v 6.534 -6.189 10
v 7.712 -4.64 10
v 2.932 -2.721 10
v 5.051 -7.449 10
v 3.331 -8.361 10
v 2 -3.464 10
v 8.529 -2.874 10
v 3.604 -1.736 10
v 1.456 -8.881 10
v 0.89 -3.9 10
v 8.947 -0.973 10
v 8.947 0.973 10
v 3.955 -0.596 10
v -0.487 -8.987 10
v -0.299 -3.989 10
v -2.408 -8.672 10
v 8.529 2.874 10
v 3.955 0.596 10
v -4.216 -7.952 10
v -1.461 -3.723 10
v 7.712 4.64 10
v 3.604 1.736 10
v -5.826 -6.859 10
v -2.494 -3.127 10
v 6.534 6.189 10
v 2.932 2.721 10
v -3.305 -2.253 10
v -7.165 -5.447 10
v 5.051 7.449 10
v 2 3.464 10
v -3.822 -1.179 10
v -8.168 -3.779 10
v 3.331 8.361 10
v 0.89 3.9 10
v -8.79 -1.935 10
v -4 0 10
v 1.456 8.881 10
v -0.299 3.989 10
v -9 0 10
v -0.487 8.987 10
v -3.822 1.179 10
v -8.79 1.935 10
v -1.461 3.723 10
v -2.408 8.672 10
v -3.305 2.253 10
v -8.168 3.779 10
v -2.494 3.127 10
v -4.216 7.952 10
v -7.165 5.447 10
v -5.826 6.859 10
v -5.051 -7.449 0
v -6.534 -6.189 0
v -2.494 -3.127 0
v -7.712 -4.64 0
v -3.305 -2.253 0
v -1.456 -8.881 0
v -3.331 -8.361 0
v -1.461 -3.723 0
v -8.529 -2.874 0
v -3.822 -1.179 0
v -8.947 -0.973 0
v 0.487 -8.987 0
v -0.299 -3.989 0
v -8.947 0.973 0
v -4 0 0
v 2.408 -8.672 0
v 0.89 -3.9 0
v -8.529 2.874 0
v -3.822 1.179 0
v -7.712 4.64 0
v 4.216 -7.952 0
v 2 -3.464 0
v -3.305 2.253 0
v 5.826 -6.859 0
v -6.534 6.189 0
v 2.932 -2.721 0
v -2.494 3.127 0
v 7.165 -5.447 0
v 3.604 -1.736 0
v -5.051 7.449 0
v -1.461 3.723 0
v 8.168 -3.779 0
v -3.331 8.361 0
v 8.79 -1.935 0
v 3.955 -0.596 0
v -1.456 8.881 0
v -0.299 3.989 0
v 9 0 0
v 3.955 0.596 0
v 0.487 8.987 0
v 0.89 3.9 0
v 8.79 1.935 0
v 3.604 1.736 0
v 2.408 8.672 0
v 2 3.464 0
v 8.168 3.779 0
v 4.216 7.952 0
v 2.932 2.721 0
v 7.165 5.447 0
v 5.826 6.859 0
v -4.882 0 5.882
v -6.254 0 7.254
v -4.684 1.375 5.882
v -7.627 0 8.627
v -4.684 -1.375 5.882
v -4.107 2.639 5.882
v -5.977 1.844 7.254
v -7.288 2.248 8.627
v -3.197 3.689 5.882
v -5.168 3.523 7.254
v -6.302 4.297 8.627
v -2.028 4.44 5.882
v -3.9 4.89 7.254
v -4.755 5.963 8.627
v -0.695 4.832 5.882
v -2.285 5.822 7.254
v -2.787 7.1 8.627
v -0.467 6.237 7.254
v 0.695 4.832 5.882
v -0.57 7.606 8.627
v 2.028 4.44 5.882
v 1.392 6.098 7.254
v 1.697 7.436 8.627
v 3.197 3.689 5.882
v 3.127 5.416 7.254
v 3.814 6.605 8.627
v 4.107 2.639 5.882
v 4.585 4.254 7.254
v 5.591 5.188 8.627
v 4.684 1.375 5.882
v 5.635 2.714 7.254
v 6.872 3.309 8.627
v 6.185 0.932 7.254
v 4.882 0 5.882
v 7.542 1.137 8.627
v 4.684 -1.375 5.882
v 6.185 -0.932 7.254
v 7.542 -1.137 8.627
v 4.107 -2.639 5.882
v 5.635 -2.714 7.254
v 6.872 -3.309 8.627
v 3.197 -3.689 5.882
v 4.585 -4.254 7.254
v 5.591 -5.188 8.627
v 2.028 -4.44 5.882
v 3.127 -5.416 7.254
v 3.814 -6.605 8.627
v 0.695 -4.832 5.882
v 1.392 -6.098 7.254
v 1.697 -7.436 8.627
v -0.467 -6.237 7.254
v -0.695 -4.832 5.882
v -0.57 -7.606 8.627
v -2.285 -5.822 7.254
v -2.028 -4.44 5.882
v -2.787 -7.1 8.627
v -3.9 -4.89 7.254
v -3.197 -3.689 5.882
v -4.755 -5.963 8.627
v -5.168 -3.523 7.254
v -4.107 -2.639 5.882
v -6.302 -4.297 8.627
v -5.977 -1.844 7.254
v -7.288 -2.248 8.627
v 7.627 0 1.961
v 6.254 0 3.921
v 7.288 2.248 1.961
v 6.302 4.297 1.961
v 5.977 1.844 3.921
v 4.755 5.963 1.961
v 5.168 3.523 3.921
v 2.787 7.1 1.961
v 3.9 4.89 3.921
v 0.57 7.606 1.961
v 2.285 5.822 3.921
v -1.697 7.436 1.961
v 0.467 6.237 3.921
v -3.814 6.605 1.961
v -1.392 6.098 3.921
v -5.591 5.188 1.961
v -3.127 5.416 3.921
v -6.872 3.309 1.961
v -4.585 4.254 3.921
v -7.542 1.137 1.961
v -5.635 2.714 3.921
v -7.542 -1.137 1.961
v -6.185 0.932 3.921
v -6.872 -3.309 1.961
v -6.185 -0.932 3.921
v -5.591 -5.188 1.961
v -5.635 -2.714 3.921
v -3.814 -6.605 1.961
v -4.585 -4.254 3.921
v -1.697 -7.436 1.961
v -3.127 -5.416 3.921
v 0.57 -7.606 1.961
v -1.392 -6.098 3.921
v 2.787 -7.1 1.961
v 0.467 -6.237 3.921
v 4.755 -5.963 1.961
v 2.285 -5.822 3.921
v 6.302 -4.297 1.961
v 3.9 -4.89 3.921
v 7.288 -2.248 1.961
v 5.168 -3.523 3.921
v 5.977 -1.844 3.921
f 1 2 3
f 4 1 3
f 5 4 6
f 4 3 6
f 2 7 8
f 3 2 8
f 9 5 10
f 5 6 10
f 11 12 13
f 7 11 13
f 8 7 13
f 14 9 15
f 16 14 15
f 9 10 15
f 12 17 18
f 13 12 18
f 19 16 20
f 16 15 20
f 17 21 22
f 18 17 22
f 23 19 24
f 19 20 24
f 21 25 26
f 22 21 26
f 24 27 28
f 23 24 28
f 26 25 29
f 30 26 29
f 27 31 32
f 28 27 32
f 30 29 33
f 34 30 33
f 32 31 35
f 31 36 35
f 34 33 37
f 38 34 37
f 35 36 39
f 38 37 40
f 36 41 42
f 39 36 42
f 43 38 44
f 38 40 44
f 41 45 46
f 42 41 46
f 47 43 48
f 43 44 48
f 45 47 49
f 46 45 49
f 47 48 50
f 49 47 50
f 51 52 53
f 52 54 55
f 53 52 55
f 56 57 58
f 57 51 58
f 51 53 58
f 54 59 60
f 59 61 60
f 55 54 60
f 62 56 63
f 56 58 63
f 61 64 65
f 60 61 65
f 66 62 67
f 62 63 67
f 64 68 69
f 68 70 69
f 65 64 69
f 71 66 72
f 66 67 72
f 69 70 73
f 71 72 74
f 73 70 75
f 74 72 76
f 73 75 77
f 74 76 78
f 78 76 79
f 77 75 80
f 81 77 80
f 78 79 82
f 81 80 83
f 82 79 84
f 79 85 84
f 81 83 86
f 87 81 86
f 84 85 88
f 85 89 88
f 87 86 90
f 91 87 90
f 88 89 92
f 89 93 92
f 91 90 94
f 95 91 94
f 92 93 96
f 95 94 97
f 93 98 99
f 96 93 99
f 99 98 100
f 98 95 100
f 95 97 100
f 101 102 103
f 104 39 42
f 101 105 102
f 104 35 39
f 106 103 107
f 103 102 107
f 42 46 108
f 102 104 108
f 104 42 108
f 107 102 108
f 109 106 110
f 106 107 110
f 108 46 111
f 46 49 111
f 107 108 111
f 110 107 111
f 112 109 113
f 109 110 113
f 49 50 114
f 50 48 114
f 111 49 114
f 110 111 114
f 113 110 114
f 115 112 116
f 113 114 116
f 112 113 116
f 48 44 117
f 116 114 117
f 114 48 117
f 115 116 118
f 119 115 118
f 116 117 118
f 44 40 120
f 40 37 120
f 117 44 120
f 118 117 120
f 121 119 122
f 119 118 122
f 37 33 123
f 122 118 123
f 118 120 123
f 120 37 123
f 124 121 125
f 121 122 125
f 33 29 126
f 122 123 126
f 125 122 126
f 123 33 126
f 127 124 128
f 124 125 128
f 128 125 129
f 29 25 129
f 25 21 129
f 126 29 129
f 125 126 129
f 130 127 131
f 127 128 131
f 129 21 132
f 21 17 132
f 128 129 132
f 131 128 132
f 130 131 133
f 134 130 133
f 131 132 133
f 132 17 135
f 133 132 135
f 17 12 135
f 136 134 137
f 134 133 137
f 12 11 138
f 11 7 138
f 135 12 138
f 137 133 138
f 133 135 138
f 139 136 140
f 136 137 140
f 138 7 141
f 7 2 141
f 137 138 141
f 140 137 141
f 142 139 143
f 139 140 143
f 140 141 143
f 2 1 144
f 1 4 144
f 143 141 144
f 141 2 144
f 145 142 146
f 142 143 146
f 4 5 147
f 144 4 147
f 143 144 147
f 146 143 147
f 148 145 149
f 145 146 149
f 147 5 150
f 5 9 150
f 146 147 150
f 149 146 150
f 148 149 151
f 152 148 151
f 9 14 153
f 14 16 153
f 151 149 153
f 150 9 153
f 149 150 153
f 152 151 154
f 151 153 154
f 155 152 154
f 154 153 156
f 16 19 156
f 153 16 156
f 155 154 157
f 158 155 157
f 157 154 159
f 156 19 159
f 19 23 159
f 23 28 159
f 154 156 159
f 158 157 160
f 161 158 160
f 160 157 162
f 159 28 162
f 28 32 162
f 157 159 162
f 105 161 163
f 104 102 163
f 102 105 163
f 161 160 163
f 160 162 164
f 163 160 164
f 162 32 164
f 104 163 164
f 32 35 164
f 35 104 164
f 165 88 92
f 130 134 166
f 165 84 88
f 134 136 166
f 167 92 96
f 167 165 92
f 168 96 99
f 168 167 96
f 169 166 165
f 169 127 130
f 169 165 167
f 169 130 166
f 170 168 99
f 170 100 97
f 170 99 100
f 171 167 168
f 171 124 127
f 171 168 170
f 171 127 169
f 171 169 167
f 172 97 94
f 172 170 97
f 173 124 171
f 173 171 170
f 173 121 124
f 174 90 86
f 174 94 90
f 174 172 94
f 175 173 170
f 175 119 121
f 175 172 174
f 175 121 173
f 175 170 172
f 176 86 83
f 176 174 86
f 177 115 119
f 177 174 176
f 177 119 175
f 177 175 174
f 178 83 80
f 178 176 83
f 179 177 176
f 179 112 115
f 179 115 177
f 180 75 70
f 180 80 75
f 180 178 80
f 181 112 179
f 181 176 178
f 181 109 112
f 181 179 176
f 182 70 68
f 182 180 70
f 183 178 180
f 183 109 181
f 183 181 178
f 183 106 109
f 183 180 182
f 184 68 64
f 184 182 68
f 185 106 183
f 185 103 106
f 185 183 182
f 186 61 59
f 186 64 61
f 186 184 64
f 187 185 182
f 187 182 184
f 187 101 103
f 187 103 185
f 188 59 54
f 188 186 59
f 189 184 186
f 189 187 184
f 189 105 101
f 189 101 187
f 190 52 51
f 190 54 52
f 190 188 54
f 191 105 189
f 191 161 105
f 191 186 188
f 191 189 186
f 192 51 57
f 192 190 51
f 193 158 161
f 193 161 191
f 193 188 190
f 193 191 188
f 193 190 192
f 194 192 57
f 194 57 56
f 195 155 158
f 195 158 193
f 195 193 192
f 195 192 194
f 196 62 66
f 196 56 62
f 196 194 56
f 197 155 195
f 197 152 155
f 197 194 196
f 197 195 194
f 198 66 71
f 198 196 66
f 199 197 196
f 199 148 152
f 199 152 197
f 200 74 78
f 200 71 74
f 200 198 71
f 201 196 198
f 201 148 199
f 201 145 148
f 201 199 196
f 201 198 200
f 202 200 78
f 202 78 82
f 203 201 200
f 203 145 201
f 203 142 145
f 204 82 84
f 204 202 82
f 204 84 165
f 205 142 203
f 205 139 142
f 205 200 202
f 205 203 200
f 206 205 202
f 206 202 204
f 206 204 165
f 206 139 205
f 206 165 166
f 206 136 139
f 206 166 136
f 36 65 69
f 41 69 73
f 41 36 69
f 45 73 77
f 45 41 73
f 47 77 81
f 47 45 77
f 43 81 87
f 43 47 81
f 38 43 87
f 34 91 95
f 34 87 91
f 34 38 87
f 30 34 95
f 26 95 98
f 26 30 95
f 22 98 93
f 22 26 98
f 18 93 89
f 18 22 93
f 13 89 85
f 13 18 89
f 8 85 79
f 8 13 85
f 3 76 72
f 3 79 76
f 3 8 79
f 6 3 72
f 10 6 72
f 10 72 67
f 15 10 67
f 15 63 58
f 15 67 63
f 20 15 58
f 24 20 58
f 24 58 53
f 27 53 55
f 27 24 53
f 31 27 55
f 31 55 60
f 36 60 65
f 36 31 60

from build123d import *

# Parameters (mm, degrees)
SKETCH1_R           = 9
BOSS_EXTRUDE1_DEPTH = 10
BOSS_EXTRUDE1_TAPER = 35
SKETCH2_R           = 9
BOSS_EXTRUDE2_DEPTH = 10
BOSS_EXTRUDE2_DRAFT = 45
SKETCH3_R           = 4
CUT_EXTRUDE1_DEPTH  = 20


with BuildPart() as part:
    # Sketch1 → Boss-Extrude1 (new body)
    with BuildSketch(Plane.XY):
        Circle(SKETCH1_R)
    extrude(amount=BOSS_EXTRUDE1_DEPTH, taper=BOSS_EXTRUDE1_TAPER)


with BuildPart() as boss_extrude2_tool:
    # Sketch2 → Boss-Extrude2 (with draft: the straight prism first)
    with BuildSketch(Plane(origin=(0, 0, 10), x_dir=(-1, 0, 0), z_dir=(0, 0, -1))):
        Circle(SKETCH2_R)
    extrude(amount=BOSS_EXTRUDE2_DEPTH)
    # Boss-Extrude2: the draft: its side faces are tilted about the plane it starts from
    boss_extrude2_sides = [boss_extrude2_tool.faces().sort_by_distance(p)[0] for p in [
        (9, 0, 5),
    ]]
    draft(boss_extrude2_sides, Plane(origin=(0, 0, 10), x_dir=(-1, 0, 0), z_dir=(0, 0, -1)), BOSS_EXTRUDE2_DRAFT)


with BuildPart() as part_1:
    add(part.part)

    # Boss-Extrude2: add boss_extrude2_tool
    add(boss_extrude2_tool.part)

    # Sketch3 → Cut-Extrude1 (cut)
    with BuildSketch(Plane(origin=(0, 0, 10), x_dir=(-1, 0, 0), z_dir=(0, 0, -1))):
        Circle(SKETCH3_R)
    extrude(amount=CUT_EXTRUDE1_DEPTH, mode=Mode.SUBTRACT)


solid = part_1.part
